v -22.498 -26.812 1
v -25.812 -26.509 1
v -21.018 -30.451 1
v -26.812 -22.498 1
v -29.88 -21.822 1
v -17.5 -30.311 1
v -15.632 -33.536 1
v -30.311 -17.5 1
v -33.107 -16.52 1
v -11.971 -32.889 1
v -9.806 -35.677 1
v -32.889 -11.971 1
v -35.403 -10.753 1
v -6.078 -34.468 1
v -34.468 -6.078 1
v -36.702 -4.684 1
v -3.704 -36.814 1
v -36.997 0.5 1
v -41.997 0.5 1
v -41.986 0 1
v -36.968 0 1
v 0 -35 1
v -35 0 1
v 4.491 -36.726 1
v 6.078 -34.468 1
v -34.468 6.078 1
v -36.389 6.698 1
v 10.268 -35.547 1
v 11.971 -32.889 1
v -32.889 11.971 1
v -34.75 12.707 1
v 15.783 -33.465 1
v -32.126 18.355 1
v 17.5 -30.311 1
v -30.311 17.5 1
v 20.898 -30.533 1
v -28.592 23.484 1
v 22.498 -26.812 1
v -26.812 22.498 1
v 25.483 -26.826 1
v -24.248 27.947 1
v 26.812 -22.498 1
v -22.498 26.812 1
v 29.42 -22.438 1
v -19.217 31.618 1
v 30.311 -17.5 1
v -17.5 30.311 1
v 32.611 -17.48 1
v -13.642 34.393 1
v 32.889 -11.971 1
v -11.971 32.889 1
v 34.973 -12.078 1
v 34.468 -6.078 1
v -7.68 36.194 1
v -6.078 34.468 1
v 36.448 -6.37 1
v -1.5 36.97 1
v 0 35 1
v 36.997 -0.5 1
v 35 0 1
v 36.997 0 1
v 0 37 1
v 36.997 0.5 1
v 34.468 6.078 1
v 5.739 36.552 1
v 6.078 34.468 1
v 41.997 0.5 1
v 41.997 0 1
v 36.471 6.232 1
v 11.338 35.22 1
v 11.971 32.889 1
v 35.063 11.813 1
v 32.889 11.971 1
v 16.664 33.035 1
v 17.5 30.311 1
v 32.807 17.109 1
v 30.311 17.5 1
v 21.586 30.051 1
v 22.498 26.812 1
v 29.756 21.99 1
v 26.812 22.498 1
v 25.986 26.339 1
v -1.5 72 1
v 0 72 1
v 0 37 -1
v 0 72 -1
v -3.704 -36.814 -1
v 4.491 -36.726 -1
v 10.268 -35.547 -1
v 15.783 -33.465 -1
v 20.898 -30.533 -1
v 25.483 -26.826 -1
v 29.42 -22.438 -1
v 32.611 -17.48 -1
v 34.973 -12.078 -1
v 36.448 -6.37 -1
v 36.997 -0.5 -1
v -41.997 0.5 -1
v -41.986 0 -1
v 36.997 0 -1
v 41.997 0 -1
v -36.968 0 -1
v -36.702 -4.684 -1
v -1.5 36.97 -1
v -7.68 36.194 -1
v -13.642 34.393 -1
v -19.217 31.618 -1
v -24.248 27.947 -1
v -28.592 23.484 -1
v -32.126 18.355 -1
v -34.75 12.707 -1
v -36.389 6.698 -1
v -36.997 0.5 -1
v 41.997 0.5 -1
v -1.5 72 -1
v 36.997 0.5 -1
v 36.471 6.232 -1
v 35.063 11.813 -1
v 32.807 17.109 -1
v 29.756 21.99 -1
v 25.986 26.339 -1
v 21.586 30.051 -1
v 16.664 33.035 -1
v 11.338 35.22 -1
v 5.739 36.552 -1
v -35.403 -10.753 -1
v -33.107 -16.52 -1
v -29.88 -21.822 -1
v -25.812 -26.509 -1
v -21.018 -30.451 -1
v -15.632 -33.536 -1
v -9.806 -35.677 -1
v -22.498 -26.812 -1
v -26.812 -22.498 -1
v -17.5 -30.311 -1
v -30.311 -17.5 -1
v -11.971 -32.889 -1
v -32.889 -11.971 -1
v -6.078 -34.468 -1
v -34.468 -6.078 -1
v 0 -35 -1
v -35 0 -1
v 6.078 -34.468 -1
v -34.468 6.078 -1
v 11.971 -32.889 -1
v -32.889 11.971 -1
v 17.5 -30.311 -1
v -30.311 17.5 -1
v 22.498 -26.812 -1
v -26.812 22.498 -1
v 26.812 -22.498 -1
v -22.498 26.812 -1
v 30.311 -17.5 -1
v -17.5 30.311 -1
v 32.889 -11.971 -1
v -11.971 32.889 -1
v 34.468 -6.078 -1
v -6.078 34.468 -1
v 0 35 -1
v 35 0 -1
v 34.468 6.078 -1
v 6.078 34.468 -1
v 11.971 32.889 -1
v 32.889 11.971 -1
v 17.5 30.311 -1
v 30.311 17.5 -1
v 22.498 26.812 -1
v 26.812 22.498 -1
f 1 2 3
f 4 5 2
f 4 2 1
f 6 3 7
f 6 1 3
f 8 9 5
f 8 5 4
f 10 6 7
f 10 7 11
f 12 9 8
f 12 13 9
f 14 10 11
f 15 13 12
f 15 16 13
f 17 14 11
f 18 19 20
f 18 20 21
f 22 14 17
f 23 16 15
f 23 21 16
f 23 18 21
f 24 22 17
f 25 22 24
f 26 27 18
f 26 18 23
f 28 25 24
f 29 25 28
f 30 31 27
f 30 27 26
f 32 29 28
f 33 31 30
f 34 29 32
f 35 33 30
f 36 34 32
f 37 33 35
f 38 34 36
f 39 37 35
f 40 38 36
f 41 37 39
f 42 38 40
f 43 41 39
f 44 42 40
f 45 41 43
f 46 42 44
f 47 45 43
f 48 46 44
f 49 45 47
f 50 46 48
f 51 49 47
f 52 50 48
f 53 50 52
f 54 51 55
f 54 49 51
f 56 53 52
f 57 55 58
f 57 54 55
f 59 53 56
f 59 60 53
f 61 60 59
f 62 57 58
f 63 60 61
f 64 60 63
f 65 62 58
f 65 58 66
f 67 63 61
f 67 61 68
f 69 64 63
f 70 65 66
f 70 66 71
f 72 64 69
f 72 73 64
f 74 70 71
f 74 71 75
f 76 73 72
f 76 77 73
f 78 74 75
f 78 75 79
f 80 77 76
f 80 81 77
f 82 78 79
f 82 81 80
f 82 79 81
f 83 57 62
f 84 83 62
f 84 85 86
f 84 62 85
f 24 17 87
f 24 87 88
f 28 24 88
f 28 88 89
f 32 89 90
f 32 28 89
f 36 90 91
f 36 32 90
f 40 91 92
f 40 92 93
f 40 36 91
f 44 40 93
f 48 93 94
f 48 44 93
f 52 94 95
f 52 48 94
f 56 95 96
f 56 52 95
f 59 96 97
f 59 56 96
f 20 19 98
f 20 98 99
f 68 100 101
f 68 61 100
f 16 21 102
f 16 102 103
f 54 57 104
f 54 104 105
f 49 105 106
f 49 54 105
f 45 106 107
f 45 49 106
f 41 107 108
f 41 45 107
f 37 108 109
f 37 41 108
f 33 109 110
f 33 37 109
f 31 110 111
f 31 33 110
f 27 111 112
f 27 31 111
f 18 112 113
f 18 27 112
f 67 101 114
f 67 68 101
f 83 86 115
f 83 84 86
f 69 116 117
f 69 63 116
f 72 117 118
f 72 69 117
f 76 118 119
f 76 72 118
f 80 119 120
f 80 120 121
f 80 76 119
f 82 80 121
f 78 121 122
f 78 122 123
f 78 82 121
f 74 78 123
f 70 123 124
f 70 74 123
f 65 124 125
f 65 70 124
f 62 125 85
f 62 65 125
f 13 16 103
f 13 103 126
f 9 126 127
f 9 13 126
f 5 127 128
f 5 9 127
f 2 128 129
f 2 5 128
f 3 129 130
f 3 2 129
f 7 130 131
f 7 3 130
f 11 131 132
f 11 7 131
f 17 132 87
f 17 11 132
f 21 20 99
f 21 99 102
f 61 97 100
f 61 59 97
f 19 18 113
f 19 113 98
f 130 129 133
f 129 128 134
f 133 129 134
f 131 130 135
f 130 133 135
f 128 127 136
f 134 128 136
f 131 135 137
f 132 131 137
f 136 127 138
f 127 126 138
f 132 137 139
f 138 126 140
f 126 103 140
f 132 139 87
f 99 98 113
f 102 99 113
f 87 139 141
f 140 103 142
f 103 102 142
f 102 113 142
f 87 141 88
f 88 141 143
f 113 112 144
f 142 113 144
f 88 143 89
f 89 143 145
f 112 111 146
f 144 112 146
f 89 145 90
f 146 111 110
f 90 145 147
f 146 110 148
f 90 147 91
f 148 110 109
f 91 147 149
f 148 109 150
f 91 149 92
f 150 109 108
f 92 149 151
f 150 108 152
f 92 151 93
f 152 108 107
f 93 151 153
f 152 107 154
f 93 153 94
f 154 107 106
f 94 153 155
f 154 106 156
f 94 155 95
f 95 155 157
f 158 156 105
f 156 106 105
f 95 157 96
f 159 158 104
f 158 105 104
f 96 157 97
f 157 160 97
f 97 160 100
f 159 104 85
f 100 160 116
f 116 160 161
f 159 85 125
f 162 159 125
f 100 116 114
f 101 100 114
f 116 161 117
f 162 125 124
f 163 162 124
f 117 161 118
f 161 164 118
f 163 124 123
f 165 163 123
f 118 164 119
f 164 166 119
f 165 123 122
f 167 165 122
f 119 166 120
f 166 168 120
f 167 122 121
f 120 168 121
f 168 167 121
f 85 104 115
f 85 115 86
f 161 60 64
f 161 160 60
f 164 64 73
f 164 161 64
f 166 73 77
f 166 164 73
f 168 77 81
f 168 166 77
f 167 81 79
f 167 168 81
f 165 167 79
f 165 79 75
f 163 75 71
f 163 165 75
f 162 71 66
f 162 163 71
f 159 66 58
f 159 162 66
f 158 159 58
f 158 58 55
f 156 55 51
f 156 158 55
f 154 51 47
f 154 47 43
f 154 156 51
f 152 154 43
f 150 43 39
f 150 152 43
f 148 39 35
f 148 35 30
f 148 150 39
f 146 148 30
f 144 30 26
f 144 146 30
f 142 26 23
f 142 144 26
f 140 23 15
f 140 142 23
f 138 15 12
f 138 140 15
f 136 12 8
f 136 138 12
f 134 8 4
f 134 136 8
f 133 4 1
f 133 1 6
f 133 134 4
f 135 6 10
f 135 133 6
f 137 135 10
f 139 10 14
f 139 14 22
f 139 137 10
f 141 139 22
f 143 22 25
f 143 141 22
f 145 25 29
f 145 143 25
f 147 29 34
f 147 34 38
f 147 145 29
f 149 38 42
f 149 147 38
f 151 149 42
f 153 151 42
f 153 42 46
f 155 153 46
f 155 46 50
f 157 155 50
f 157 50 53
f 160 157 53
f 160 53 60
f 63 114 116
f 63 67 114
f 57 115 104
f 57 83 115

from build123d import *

# Parameters (mm, degrees)
F0_R     = 35
F1_DEPTH = 1


with BuildPart() as f1:
    # F0 (on Top) → F1 (new body, symmetric)
    with BuildSketch(Plane.XY):
        with BuildLine():
            Line((-1.5, 72), (-1.5, 36.969582))
            ThreePointArc((-1.5, 36.969582), (-26.514279, 25.806841), (-36.996623, 0.499897))
            Line((-36.996623, 0.499897), (-41.996623, 0.499897))
            Line((-41.996623, 0.499897), (-41.986487, 0))
            Line((-41.986487, 0), (-36.968242, 0))
            Line((-36.968242, 0), (-36.702311, -4.684058))
            ThreePointArc((-36.702311, -4.684058), (-25.811947, -26.509307), (-3.704199, -36.814113))
            Line((-3.704199, -36.814113), (4.491361, -36.726389))
            ThreePointArc((4.491361, -36.726389), (27.539081, -24.710302), (36.996621, -0.5))
            Line((36.996621, -0.5), (36.996621, 0))
            Line((36.996621, 0), (41.996621, 0))
            Line((41.996621, 0), (41.996621, 0.5))
            Line((41.996621, 0.5), (36.996621, 0.5))
            ThreePointArc((36.996621, 0.5), (25.985573, 26.339134), (0, 37))
            Line((0, 37), (0, 72))
            Line((0, 72), (-1.5, 72))
        make_face()
        Circle(F0_R, mode=Mode.SUBTRACT)
    extrude(amount=F1_DEPTH, both=True)


solid = f1.part
